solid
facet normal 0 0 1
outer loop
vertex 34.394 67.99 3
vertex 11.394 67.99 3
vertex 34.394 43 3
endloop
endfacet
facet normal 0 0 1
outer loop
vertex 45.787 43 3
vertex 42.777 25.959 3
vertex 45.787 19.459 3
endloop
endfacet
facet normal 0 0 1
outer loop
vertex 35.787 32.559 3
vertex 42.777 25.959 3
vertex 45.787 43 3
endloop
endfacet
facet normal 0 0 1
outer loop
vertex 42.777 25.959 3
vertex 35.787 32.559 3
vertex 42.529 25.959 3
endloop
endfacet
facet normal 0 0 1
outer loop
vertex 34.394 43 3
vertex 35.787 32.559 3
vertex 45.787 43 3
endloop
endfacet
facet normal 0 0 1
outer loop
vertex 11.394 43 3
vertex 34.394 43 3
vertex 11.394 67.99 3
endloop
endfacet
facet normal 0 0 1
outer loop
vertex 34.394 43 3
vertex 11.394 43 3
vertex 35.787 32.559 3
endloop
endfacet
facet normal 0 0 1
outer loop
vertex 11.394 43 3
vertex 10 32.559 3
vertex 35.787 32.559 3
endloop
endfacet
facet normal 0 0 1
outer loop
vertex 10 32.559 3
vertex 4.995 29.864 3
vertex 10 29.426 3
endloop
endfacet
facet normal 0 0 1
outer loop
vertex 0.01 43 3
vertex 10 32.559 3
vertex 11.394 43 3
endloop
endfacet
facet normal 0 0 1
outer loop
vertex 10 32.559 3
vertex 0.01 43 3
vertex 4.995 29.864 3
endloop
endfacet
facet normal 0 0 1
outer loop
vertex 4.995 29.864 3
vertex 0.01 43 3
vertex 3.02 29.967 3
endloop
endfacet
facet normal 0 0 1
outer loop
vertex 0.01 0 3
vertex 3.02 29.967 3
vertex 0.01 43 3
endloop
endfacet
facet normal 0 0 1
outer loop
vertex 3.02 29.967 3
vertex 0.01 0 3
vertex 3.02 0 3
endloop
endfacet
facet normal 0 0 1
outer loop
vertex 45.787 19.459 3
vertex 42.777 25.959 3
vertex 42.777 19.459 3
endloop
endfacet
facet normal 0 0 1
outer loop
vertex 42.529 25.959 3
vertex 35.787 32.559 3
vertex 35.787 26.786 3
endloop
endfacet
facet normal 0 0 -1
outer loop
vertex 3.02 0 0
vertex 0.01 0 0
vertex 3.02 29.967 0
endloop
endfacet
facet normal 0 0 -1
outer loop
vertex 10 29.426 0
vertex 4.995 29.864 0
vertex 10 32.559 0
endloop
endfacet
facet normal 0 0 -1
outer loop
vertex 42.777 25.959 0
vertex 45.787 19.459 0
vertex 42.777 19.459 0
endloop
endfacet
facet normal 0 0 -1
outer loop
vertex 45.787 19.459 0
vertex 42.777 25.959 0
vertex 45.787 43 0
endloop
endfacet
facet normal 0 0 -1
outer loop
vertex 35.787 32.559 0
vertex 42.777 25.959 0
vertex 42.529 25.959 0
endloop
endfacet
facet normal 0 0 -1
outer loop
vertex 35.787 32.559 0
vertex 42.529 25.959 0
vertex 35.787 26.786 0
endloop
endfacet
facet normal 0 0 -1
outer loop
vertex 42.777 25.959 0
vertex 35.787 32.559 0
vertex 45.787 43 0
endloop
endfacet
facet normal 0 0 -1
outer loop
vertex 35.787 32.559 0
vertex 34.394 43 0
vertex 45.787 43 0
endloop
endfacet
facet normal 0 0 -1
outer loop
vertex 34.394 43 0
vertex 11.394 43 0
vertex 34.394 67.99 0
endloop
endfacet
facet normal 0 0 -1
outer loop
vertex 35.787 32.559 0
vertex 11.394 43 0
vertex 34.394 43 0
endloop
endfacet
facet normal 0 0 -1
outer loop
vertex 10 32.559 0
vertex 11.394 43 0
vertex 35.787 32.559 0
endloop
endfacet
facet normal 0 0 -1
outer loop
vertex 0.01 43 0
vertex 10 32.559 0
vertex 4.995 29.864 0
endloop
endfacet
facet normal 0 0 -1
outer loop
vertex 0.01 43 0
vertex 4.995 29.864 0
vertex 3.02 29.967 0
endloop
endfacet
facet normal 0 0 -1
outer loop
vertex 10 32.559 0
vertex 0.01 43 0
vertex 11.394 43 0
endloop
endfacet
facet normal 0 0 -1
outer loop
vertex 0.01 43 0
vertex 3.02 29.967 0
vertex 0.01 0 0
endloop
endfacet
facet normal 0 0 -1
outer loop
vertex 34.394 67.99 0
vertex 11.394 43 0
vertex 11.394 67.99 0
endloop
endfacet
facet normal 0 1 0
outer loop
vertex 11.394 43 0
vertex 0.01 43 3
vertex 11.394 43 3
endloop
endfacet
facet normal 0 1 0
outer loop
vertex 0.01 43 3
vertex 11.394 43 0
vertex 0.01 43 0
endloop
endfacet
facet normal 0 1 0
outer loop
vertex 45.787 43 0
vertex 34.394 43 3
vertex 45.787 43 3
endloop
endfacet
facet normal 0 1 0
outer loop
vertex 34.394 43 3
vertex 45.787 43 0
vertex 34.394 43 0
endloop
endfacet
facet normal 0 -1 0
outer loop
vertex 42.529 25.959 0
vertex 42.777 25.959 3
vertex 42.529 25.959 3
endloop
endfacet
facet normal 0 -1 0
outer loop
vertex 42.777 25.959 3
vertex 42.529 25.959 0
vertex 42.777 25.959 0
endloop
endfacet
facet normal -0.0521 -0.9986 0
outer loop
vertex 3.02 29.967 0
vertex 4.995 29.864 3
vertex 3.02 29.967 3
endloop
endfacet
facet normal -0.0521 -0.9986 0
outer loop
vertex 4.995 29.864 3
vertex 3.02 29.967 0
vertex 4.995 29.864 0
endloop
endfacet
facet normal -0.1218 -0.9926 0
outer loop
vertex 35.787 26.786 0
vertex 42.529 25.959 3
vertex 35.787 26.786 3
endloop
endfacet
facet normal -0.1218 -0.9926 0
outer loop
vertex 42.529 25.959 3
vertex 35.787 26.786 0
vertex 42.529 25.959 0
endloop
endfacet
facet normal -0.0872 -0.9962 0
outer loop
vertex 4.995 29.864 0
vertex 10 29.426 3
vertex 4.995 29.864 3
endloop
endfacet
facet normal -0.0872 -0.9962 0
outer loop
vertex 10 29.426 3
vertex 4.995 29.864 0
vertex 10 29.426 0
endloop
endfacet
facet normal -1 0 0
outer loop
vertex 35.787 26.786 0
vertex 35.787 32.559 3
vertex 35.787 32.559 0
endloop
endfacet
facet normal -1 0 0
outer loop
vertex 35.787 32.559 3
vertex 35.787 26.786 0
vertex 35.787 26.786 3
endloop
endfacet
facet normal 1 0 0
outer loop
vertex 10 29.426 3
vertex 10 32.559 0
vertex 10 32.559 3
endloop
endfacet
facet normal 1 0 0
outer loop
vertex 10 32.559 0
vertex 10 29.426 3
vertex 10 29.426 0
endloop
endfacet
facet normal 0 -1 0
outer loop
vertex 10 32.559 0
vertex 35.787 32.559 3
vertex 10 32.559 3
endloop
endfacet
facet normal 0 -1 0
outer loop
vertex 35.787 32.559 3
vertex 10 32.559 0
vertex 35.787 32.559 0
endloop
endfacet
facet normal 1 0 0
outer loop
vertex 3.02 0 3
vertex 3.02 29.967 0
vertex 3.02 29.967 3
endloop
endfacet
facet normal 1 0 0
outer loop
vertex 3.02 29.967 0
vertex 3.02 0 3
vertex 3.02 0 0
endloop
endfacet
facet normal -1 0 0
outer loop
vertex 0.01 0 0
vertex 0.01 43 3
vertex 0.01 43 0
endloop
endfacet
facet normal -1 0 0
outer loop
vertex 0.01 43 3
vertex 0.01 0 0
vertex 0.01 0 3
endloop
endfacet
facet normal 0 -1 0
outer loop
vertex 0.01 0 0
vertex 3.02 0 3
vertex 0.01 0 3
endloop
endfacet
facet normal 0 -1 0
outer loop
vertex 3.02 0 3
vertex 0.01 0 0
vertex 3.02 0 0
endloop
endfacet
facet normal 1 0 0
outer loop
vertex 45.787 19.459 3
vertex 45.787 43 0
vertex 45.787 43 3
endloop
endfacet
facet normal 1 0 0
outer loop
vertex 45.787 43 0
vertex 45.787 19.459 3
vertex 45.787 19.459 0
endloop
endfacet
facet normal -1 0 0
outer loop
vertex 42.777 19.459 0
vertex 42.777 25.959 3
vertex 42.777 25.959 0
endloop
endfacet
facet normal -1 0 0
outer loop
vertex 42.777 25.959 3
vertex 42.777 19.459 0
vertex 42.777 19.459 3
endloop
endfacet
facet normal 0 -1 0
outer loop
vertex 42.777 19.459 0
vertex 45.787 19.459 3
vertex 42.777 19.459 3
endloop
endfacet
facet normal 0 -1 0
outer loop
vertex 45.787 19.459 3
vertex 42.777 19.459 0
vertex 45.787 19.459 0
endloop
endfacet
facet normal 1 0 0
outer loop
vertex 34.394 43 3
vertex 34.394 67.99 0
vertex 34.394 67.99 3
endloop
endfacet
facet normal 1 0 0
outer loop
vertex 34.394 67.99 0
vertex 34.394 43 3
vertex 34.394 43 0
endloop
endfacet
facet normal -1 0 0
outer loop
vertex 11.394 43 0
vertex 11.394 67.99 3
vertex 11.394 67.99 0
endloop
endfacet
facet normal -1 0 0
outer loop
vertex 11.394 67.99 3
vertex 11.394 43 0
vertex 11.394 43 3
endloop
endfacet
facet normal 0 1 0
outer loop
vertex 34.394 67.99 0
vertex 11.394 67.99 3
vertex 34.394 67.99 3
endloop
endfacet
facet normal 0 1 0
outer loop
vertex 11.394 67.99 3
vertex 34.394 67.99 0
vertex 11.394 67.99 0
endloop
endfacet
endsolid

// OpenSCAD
$fa = 2;    // minimum angle (fine resolution)
$fs = 0.2;  // minimum size (fine resolution)


epsilon = 0.01;

pi = 3.1415926535;

layer = 0.2;

width = 3; // temporary; eventually to be 60

function radians(deg) = deg * pi / 180;

module down(k) {
  translate([0,0,-k])
  children();
}


slop = 1; // extra width in mm

theta_d = 4; // degrees
theta1 = 3.8;
theta_avg = theta1 + theta_d / 2.0;
theta2 = theta1 + theta_d;

radius = 40 / radians(theta_d);

gapheight = 3;
h1 = 10 + gapheight; // z thickness of stand in mm

y = radius * cos(theta1) + h1;

d1 = 30; // depth of rear stop, mm
d2 = 6.5; // depth of front stop, mm

h2 = y - radius * cos(theta1 + theta_d);

x1 = radius * sin(theta1);
x2 = radius * sin(theta2);

y1 = radius * cos(theta2);
y2 = radius * cos(theta2);

thickness = 3; // of front and back tabs

mountx = 23; // tab for camera mount
mounty = 25; 

translate([thickness - x1, h1 + d1 - y, 0]) 
  union () {


//    difference () {
//      translate([x1 - thickness, bot, 0])
//        cube([x2 - x1 + 2 * thickness, y - bot, width]);
//      down(epsilon) cylinder(r=radius, h = width + 2 * epsilon);
//    }

    difference () {
      translate([x1 - epsilon, y2, 0])
        cube([x2 - x1 + 2 * epsilon, y - y2, width]);
      down(epsilon) cylinder(r=radius, h = width + 2 * epsilon);
      touch = 7;  // approx length in x of touching surface in mm
      translate([x1+touch, y2, -epsilon])
        cube([x2 - x1 - 2 * touch, 2.2 * gapheight, width+2*epsilon]);
    }

  translate([x1 + epsilon - thickness, y - (h1 + d1), 0])
    cube([thickness+epsilon, d1 + h1, width]);

  translate([x2 - epsilon, y - (h2 + d2), 0])
    cube([thickness+epsilon, d2 + h2, width]);

  translate([(x1+x2)/2 - mountx/2, y - epsilon, 0])
    cube([mountx, mounty, thickness]);

  }

        
